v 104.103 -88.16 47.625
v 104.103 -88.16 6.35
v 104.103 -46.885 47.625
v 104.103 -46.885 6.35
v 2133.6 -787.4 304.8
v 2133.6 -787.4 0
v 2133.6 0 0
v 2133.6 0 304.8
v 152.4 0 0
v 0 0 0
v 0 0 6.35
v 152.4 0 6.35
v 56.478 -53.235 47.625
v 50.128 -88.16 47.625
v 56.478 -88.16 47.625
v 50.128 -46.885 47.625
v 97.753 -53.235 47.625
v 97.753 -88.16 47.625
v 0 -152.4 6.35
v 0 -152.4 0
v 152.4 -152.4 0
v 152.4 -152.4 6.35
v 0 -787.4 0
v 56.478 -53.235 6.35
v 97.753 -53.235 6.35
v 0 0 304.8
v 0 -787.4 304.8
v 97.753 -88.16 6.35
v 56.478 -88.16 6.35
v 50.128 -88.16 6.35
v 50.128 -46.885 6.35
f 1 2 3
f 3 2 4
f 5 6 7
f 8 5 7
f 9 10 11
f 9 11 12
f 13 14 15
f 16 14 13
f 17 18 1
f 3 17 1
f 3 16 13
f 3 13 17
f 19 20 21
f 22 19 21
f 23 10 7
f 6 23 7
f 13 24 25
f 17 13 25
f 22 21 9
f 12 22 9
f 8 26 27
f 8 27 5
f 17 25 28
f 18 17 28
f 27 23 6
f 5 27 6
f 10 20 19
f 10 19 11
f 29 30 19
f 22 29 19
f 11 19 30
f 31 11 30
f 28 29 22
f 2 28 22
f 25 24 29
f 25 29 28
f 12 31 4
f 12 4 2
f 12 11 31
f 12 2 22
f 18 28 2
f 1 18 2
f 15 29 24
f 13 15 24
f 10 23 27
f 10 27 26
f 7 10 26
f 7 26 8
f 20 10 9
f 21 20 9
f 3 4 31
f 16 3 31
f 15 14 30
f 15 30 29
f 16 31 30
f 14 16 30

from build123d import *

# Parameters (mm, degrees)
F0_W     = 2133.6
F0_H     = 787.4
F1_DEPTH = 304.8
F2_W     = 152.4
F2_H     = 152.4
F3_DEPTH = 6.35
F5_DEPTH = 41.275


with BuildPart() as f1:
    # F0 (on Top) → F1 (new body)
    with BuildSketch(Plane.XY):
        with Locations((1066.8, -393.7)):
            Rectangle(F0_W, F0_H)
    extrude(amount=F1_DEPTH)


with BuildPart() as f3:
    # F2 (on Top) → F3 (new body)
    with BuildSketch(Plane.XY):
        with Locations((76.2, -76.2)):
            Rectangle(F2_W, F2_H)
    extrude(amount=F3_DEPTH)

    # F4 (on face) → F5 (join)
    with BuildSketch(Plane.XY.offset(6.35)):
        Polygon((50.127938, -46.885129), (50.127938, -88.160129), (56.477938, -88.160129), (56.477938, -53.235129), (97.752938, -53.235129), (97.752938, -88.160129), (104.102938, -88.160129), (104.102938, -46.885129), align=None)
    extrude(amount=F5_DEPTH)


solid = Compound([f1.part, f3.part])
